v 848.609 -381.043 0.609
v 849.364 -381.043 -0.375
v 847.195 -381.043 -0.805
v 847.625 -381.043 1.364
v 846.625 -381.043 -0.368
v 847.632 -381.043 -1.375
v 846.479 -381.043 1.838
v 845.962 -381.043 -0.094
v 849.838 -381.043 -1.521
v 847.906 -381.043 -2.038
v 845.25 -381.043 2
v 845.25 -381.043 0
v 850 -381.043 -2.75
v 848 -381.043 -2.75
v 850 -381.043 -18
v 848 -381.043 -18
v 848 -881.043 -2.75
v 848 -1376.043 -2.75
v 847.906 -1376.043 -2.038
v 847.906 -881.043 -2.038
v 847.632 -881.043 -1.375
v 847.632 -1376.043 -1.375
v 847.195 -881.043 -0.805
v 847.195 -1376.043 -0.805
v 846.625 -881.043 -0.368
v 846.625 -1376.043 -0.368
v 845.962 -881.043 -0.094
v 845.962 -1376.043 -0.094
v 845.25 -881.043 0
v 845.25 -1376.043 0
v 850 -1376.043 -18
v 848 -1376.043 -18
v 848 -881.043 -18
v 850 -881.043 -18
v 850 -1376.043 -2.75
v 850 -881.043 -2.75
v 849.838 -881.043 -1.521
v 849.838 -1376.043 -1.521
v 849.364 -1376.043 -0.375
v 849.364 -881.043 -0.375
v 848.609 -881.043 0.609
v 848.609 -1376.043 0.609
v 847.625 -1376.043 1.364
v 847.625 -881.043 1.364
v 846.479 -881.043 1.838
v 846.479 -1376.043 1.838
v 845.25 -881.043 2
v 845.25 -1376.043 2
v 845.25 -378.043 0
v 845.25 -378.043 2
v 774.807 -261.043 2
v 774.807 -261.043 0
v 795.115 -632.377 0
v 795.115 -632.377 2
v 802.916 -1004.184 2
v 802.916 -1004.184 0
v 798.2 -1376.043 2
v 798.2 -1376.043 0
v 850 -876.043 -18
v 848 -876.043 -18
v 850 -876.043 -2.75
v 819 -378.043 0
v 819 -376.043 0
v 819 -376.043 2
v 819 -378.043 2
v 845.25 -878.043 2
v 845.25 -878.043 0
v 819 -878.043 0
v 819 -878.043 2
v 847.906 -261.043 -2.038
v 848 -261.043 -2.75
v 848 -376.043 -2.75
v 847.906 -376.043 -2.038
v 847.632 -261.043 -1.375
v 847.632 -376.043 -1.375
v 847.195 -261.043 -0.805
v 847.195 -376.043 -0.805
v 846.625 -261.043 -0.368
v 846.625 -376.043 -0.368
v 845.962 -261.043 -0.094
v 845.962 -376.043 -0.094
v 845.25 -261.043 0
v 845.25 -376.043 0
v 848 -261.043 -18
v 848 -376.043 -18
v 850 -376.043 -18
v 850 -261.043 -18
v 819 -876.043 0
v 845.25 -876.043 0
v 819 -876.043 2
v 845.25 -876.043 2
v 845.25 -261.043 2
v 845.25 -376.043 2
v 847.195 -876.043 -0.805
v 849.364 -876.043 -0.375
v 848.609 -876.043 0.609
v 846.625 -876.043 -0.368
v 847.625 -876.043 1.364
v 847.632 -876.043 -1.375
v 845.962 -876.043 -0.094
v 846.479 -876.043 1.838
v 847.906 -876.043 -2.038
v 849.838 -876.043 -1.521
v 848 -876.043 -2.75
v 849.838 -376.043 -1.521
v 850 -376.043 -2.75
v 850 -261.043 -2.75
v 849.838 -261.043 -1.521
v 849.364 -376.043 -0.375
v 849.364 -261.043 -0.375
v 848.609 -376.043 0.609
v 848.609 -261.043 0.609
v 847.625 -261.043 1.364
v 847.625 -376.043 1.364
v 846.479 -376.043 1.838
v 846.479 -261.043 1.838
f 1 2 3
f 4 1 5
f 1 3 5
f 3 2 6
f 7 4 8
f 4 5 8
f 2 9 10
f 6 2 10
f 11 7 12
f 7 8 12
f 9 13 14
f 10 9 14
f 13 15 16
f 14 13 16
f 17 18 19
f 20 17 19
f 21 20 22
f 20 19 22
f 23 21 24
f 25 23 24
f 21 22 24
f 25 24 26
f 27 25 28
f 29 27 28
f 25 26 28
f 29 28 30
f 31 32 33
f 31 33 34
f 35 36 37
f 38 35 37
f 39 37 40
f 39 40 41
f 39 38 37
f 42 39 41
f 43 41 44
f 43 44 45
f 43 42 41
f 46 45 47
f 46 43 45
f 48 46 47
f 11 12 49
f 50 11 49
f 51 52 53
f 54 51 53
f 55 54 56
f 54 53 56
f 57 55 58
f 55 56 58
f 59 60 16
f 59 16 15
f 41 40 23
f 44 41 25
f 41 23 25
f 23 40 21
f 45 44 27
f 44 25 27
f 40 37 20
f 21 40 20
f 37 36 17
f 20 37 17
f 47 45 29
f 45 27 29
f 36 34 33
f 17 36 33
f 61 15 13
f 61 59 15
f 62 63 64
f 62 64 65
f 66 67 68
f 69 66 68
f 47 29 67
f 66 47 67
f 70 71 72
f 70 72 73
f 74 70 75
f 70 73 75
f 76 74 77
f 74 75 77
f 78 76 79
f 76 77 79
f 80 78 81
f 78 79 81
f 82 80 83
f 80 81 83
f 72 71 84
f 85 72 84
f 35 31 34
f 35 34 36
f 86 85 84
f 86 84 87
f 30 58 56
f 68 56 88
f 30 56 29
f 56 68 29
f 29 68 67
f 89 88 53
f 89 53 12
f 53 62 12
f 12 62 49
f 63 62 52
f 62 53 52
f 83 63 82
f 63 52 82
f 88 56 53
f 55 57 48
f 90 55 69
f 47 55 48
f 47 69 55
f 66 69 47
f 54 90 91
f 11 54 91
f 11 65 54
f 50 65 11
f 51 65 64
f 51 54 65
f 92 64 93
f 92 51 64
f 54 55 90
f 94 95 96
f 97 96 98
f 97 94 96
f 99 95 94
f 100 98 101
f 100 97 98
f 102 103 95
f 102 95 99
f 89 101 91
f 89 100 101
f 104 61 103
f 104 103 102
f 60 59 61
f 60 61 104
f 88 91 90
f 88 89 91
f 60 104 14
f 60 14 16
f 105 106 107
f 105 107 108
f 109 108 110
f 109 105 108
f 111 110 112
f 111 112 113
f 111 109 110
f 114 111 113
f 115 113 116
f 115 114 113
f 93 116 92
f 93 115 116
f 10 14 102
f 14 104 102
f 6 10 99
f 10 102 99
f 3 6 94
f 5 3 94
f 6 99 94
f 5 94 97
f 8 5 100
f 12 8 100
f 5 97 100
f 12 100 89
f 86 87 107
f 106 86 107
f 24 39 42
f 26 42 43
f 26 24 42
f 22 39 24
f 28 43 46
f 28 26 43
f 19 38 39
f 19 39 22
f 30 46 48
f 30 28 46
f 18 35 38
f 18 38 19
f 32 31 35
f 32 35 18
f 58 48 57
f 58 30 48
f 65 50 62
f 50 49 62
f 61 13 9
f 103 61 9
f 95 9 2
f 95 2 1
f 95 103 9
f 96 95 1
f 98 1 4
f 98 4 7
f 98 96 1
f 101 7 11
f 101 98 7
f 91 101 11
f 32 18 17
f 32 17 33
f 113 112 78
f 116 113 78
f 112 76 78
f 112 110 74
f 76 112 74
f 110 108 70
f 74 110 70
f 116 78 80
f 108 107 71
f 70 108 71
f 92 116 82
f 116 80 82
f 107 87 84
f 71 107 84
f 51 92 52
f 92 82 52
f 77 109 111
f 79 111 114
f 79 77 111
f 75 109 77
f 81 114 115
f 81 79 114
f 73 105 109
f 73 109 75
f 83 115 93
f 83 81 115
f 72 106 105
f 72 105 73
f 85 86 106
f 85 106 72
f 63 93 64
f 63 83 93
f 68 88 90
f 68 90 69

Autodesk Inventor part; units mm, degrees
ref_plane "YZ Plane" through (0, 0, 0) normal (1, 0, 0) x (0, 1, 0)
ref_plane "XZ Plane" through (0, 0, 0) normal (0, 1, 0) x (-1, 0, 0)
ref_plane "XY Plane" through (0, 0, 0) normal (0, 0, 1) x (1, 0, 0)
sketch "Sketch1" plane through (0, 0, 0) normal (0, 0, 1) x (1, 0, 0)
  arc A0 (750, -2100) -> (770.3488, -241.0426) centre (-10250, -1050) ccw construction
  arc A1 (752.9864, -2100.2851) -> (771.4818, -215.8854) centre (-10246.9892, -1050.0296) ccw
  line L0 (-750, -2700) -> (-750, 0) construction
  line L1 (-800, 50) -> (-800, -2750) construction
  line L2 (-850, -2800) -> (-850, 100) construction
  line L3 (850, 100) -> (850, -2800)
  line L4 (800, -2750) -> (800, 50) construction
  line L5 (750, 0) -> (750, -2700) construction
  line L6 (770.3488, -241.0426) -> (767.3569, -241.2622) construction
  line L7 (768.4904, -216.1118) -> (771.4818, -215.8854) construction
  arc A2 (747.4657, -5.0326) -> (744.8748, -2.3426) centre (744.4792, -5.3164) ccw construction
  arc A3 (747.4657, -5.0326) -> (747.0136, -0.2851) centre (-10252.9895, -1050.2524) ccw construction
  arc A4 (767.3569, -241.2622) -> (747.4657, -5.0326) centre (-10252.9895, -1050.2524) ccw construction
  line L8 (750, 0) -> (747.0136, -0.2851) construction
  arc A5 (750.4522, -4.7486) -> (750, 0) centre (-10250, -1050) ccw construction
  arc A6 (750.4522, -4.7486) -> (745.2706, 0.6314) centre (744.4791, -5.3162) ccw
  line L9 (-750, 0) -> (750, 0) construction
  line L10 (-850, 100) -> (850, 100) construction
  line L11 (800, 50) -> (-800, 50) construction
  arc A7 (770.3488, -241.0426) -> (750.4522, -4.7486) centre (-10250, -1050) ccw
  line L12 (750, -2700) -> (-750, -2700) construction
  line L13 (750, -2100) -> (752.9864, -2100.2851) construction
  line L14 (-800, -2750) -> (800, -2750)
  line L15 (850, -2800) -> (-850, -2800) construction
  arc A8 (110, -2700) -> (114.1118, -2698.3696) centre (110, -2694) ccw construction
  line L16 (0, -2697) -> (110, -2697) construction
  line L17 (0, -2700) -> (0, -2697) construction
  arc A9 (750, 0) -> (745.2706, 0.6314) centre (0, -5600) ccw construction
  line L18 (750, 0) -> (749.6018, -2.9735) construction
  arc A10 (750, -3.0268) -> (0, 47) centre (-0.2, -5603) ccw construction
  line L19 (0, 47) -> (0, 0) construction
  line L20 (0, 50) -> (0, 47) construction
  line L21 (0, 100) -> (0, 50)
  arc A11 (745.2706, 0.6314) -> (0, 50) centre (0, -5600) ccw construction
  line L22 (-750, -2100) -> (750, -2100) construction
  arc A12 (110, -2697) -> (112.0559, -2696.1848) centre (110, -2694) ccw construction
  line L23 (676.3163, -2173.4556) -> (674.2605, -2171.2708) construction
  line L24 (690.4112, -2151.9536) -> (692.4671, -2154.1384) construction
  line L25 (752.0559, -2102.1848) -> (676.3163, -2173.4556) construction
  line L26 (114.1118, -2698.3696) -> (750, -2100) construction
  arc A13 (752.0559, -2102.1848) -> (752.9864, -2100.2851) centre (749.9998, -2099.9999) ccw construction
  line L27 (750, -2100) -> (752.0559, -2102.1848) construction
  arc A14 (749.1768, -2100.7746) -> (750.1074, -2098.8746) centre (747.1209, -2098.5898) ccw construction
  line L28 (112.0559, -2696.1848) -> (690.4112, -2151.9536) construction
  line L29 (850, -261.0426) -> (774.8074, -261.0426)
  arc A15 (800, 50) -> (0, 100) centre (0, -6325) ccw construction
  arc A16 (824.8074, -261.0426) -> (800, 50) centre (-10695.3477, -1023.3288) ccw construction
  line L30 (824.8074, -261.0426) -> (824.8074, 100) construction
  arc A17 (789.9065, -2131.1044) -> (824.8074, -261.0426) centre (-10201.0809, -990.6233) ccw construction
  line L31 (0, -2700) -> (0, -2750) construction
  line L32 (112.3791, -2700) -> (132.2053, -2750) construction
  line L33 (132.2053, -2750) -> (850, -2074.5565)
  arc A18 (770.2924, -241.0467) -> (766.5756, -191.1852) centre (768.4904, -216.1118) ccw construction
  line L34 (850, -400) -> (783.8749, -400) construction
  line L35 (850, -900) -> (801.9923, -900) construction
  line L36 (850, -1400) -> (797.4674, -1400) construction
  line L37 (850, -1900) -> (770.2723, -1900) construction
  line L38 (350, 100) -> (350, 39.1489)
  line L39 (-1472.612, -150) -> (-973.4947, -150)
  line L40 (-1472.612, -700) -> (-973.4947, -700)
  line L41 (-1472.612, -1250) -> (-973.4947, -1250)
  line L42 (-1472.612, -1800) -> (-973.4947, -1800)
  line L43 (800, -2750) -> (850, -2750) construction
  line L44 (752.9864, -2100.2851) -> (850, -2100.2851)
  point P0 (822.6583, -2100.2851)
  dimension "d16" = 1500
  dimension "d17" = 2700
  dimension "d18" = 2100
  dimension "d19" = 6
  dimension "d20" = 3
  dimension "d21" = 3
  dimension "d22" = 6
  dimension "d23" = 3
  dimension "d24" = 241.9
  dimension "d25" = 50
  dimension "d26" = 50
  dimension "d27" = 3
  dimension "d28" = 110
  dimension "d29" = 25
  dimension "d30" = 104
  dimension "d31" = 25
  dimension "d32" = 20
  dimension "d33" = 50
  dimension "d57" = 500
  dimension "d58" = 500
  dimension "d59" = 500
  dimension "d60" = 500
  dimension "d61" = 500
  dimension "d83" = 250
  dimension "d86" = 550
  dimension "d91" = 274.5565
extrude "Plate3" add sketch "Sketch1" along normal blind 2
sketch "Sketch3" plane through (848, -261.0426, 2) normal (1, 0, 0) x (0, 1, 0)
  line L0 (-1839.2425, 0) -> (0, 0)
  line L1 (0, 0) -> (0, 20)
  line L2 (0, 20) -> (-1839.2425, 20)
  line L3 (-1839.2425, 20) -> (-1839.2425, 0)
edge flange "Flange2" height 20 angle 90 thickness 2 bend radius 2.75 thickness toward (1, 0, 0) relief round relief width 2 relief depth 1 edges at (850, -1167.7996, 2) wall of the first edge with corners at (848, -2100.2851, 2) (848, -261.0426, 2) (848, -261.0426, -18) (848, -2100.2851, -18)
bend "Bend2"
corner "Corner2"
sketch "Sketch5" plane through (0, 0, 0) normal (0, 0, 1) x (1, 0, 0)
  line L0 (845.25, -2100.2851) -> (845.25, -261.0426) projected
  line L1 (774.8074, -261.0426) -> (845.25, -261.0426) projected
  arc A0 (752.9864, -2100.2851) -> (774.8074, -261.0426) centre (-10246.9892, -1050.0296) ccw projected
  line L2 (850, -261.0426) -> (850, -2100.2851) projected
  line L3 (850, -376.0426) -> (819, -376.0426)
  line L4 (850, -378.0426) -> (848, -378.0426) construction
  line L5 (848, -2100.2851) -> (848, -261.0426) projected
  line L6 (819, -376.0426) -> (819, -378.0426)
  line L7 (850, -876.0416) -> (801.641, -876.0416) construction
  line L8 (850, -878.0416) -> (801.6723, -878.0416) construction
  line L9 (820, -876.0416) -> (820, -878.0416) construction
  line L10 (850, -1376.0416) -> (798.2005, -1376.0416) construction
  line L11 (850, -1378.0416) -> (798.1413, -1378.0416) construction
  line L12 (820, -1376.0416) -> (820, -1378.0416) construction
  line L13 (850, -1876.0416) -> (772.0945, -1876.0416) construction
  line L14 (850, -1878.0416) -> (771.9443, -1878.0416) construction
  line L15 (820, -1876.0416) -> (820, -1878.0416) construction
  line L16 (850, -881.0416) -> (845.25, -881.0416) construction
  line L17 (845.25, -1381.0416) -> (850, -1381.0416) construction
  line L18 (845.25, -1881.0416) -> (850, -1881.0416) construction
  line L19 (845.25, -2100.2851) -> (752.9864, -2100.2851) projected
  line L20 (850, -376.0426) -> (850, -381.0426)
  line L21 (848, -376.0426) -> (848, -378.0426) construction
  line L22 (850, -381.0426) -> (848, -381.0426)
  line L23 (819, -376.0426) -> (782.437, -376.0426) construction
  line L24 (819, -378.0426) -> (782.559, -378.0426) construction
  line L25 (848, -378.0426) -> (848, -381.0426)
  line L26 (848, -378.0426) -> (819, -378.0426)
  line L27 (848, -381.0426) -> (845.25, -381.0426)
  point P0 (0, 0)
  point P1 (845.25, -380.4205)
  point P2 (848, -380.4205)
  point P3 (848, -1881.0416)
  point P4 (848, -1878.0416)
  point P5 (848, -1381.0416)
  point P6 (848, -1378.0416)
  point P7 (848, -881.0416)
  point P8 (848, -878.0416)
  point P9 (819, -377.0426)
  point P10 (848, -381.0426)
  point P11 (850, -410.4205)
  point P12 (848, -376.0426)
  point P13 (820, -877.0416)
  point P14 (820, -1377.0416)
  point P15 (820, -1877.0416)
  point P16 (848, -381.0426)
  point P17 (845.25, -378.0426)
  dimension "d69" = 1839.2425
  dimension "d70" = 2
  dimension "d76" = 67.563
  dimension "d80" = 48.359
  dimension "d81" = 30
  dimension "d94" = 5
  dimension "d95" = 30
  dimension "d96" = 5
  dimension "d97" = 30
  dimension "d98" = 5
  dimension "d102" = 77.9056
  dimension "d104" = 51.7995
  dimension "d106" = 2
  dimension "d107" = 5
  dimension "d108" = 116
  dimension "d109" = 500
  dimension "d110" = 500
  dimension "d111" = 500
  dimension "d112" = 31
extrude "Extrusion2" cut sketch "Sketch5" along normal through all both and the other way through all contours L0 L26 L5 L27 | L26 L6 L3 L0 | L0 L3 L5 L26 | L5 L3 L2 L22
chamfer "Chamfer2" [suppressed]
pattern_linear "Rectangular Pattern3" count 4 spacing 500 along (0, -1, 0) of "Extrusion2"
sketch "Sketch6" plane through (0, 0, 0) normal (0, 0, -1) x (-1, 0, 0)
  line L0 (-803.1643, -1276.0426) -> (-817.1643, -1276.0426) construction
  line L1 (-817.1643, -1276.0426) -> (-817.1643, -1076.0426) construction
  line L2 (-817.1643, -1076.0426) -> (-803.1643, -1076.0426) construction
  line L3 (-803.1643, -1076.0426) -> (-803.1643, -1276.0426) construction
  line L4 (-752.9864, -2100.2851) -> (-845.25, -2100.2851) projected
  line L5 (-803.1643, -1801.0426) -> (-803.1643, -1851.0426) construction
  line L6 (-803.1643, -1851.0426) -> (-815.1643, -1851.0426) construction
  line L7 (-815.1643, -1851.0426) -> (-815.1643, -1801.0426) construction
  line L8 (-815.1643, -1801.0426) -> (-803.1643, -1801.0426) construction
  line L9 (-845.25, -1876.0426) -> (-819, -1876.0426) projected
  line L10 (-803.1643, -1301.0426) -> (-803.1643, -1351.0426) construction
  line L11 (-803.1643, -1351.0426) -> (-815.1643, -1351.0426) construction
  line L12 (-815.1643, -1351.0426) -> (-815.1643, -1301.0426) construction
  line L13 (-815.1643, -1301.0426) -> (-803.1643, -1301.0426) construction
  line L14 (-803.1643, -801.0426) -> (-803.1643, -851.0426) construction
  line L15 (-803.1643, -851.0426) -> (-815.1643, -851.0426) construction
  line L16 (-815.1643, -851.0426) -> (-815.1643, -801.0426) construction
  line L17 (-815.1643, -801.0426) -> (-803.1643, -801.0426) construction
  line L18 (-803.1643, -301.0426) -> (-803.1643, -351.0426) construction
  line L19 (-803.1643, -351.0426) -> (-815.1643, -351.0426) construction
  line L20 (-815.1643, -351.0426) -> (-815.1643, -301.0426) construction
  line L21 (-815.1643, -301.0426) -> (-803.1643, -301.0426) construction
  line L22 (-845.25, -1376.0426) -> (-819, -1376.0426) projected
  line L23 (-845.25, -876.0426) -> (-819, -876.0426) projected
  line L24 (-845.25, -376.0426) -> (-819, -376.0426) projected
  point P0 (0, 0)
  point P1 (-753.1643, -2098.4205)
  point P2 (-824.6397, -2098.4205)
  dimension "d120" = 200
  dimension "d121" = 14
  dimension "d124" = 50
  dimension "d125" = 12
  dimension "d126" = 50
  dimension "d127" = 25
  dimension "d128" = 50
  dimension "d129" = 12
  dimension "d130" = 50
  dimension "d131" = 12
  dimension "d132" = 50
  dimension "d133" = 12
  dimension "d134" = 50
  dimension "d135" = 25
  dimension "d136" = 25
  dimension "d137" = 25
  dimension "d138" = 50
  dimension "d139" = 50
  dimension "d140" = 50
  dimension "d143" = 100
mark "Mark1"
sketch "Sketch7" plane through (0, 0, 0) normal (0, 0, 1) x (1, 0, 0)
  line L0 (845.25, -1878.0426) -> (819, -1878.0426) construction
  line L1 (819, -1878.0426) -> (819, -1876.0426) construction
  line L2 (819, -1876.0426) -> (845.25, -1876.0426) construction
  line L3 (845.25, -1876.0426) -> (845.25, -1381.0426) construction
  line L4 (845.25, -1381.0426) -> (845.25, -1378.0426) construction
  line L5 (845.25, -1378.0426) -> (819, -1378.0426) construction
  line L6 (819, -1378.0426) -> (819, -1376.0426) construction
  line L7 (819, -1376.0426) -> (845.25, -1376.0426) construction
  line L8 (845.25, -1376.0426) -> (845.25, -881.0426) construction
  line L9 (845.25, -881.0426) -> (845.25, -878.0426) construction
  line L10 (845.25, -878.0426) -> (819, -878.0426) construction
  line L11 (819, -878.0426) -> (819, -876.0426) construction
  line L12 (819, -876.0426) -> (845.25, -876.0426) construction
  line L13 (845.25, -876.0426) -> (845.25, -381.0426) construction
  line L14 (845.25, -381.0426) -> (845.25, -378.0426) projected
  line L15 (845.25, -378.0426) -> (819, -378.0426) projected
  line L16 (819, -378.0426) -> (819, -376.0426) projected
  line L17 (819, -376.0426) -> (845.25, -376.0426) projected
  line L18 (845.25, -376.0426) -> (845.25, -261.0426) projected
  line L19 (774.8074, -261.0426) -> (845.25, -261.0426) projected
  arc A0 (752.9864, -2100.2851) -> (774.8074, -261.0426) centre (-10246.9892, -1050.0296) ccw construction
  line L20 (845.25, -2100.2851) -> (752.9864, -2100.2851) construction
  line L21 (845.25, -2100.2851) -> (845.25, -1881.0426) construction
  line L22 (845.25, -1881.0426) -> (845.25, -1878.0426) construction
  line L23 (716.6808, -2132.1957) -> (990.5996, -2132.1957)
  line L24 (990.5996, -2132.1957) -> (990.5996, -1376.0426)
  line L25 (990.5996, -1376.0426) -> (716.6808, -1376.0426)
  line L26 (716.6808, -1376.0426) -> (716.6808, -2132.1957)
  point P0 (0, 0)
extrude "Extrusion3" cut sketch "Sketch7" along normal through all both and the other way through all
equation "\"d16\" = d34"
equation "\"d17\" = d35"
equation "\"d18\" = d36"
equation "\"d19\" = d37"
equation "\"d20\" = d38"
equation "\"d21\" = d39"
equation "\"d22\" = d39 + d43"
equation "\"d23\" = d39"
equation "\"d27\" = d39"
equation "\"d28\" = 0.5 * d44"
equation "\"d29\" = d41"
equation "\"d30\" = d42"
equation "\"d31\" = d41"
equation "\"d33\" = d25"
equation "\"Стрингер_3\" = 67.36301"
equation "\"d37\" = d39 + d43"
equation "\"d38\" = d39"
equation "\"d43\" = d39"
equation "\"Стрингер_4\" = 48.15903"
equation "\"Стрингер_5\" = 51.59945"
equation "\"Стрингер_6\" = 77.70555"
equation "\"d34\" = 1500"
equation "\"d35\" = 2700"
equation "\"d36\" = 2100"
equation "\"d39\" = 3"
equation "\"d44\" = 220"
equation "\"d41\" = 25"
equation "\"d42\" = 104"
properties part number "MSC 315 rib hip" material "Stainless Steel"
